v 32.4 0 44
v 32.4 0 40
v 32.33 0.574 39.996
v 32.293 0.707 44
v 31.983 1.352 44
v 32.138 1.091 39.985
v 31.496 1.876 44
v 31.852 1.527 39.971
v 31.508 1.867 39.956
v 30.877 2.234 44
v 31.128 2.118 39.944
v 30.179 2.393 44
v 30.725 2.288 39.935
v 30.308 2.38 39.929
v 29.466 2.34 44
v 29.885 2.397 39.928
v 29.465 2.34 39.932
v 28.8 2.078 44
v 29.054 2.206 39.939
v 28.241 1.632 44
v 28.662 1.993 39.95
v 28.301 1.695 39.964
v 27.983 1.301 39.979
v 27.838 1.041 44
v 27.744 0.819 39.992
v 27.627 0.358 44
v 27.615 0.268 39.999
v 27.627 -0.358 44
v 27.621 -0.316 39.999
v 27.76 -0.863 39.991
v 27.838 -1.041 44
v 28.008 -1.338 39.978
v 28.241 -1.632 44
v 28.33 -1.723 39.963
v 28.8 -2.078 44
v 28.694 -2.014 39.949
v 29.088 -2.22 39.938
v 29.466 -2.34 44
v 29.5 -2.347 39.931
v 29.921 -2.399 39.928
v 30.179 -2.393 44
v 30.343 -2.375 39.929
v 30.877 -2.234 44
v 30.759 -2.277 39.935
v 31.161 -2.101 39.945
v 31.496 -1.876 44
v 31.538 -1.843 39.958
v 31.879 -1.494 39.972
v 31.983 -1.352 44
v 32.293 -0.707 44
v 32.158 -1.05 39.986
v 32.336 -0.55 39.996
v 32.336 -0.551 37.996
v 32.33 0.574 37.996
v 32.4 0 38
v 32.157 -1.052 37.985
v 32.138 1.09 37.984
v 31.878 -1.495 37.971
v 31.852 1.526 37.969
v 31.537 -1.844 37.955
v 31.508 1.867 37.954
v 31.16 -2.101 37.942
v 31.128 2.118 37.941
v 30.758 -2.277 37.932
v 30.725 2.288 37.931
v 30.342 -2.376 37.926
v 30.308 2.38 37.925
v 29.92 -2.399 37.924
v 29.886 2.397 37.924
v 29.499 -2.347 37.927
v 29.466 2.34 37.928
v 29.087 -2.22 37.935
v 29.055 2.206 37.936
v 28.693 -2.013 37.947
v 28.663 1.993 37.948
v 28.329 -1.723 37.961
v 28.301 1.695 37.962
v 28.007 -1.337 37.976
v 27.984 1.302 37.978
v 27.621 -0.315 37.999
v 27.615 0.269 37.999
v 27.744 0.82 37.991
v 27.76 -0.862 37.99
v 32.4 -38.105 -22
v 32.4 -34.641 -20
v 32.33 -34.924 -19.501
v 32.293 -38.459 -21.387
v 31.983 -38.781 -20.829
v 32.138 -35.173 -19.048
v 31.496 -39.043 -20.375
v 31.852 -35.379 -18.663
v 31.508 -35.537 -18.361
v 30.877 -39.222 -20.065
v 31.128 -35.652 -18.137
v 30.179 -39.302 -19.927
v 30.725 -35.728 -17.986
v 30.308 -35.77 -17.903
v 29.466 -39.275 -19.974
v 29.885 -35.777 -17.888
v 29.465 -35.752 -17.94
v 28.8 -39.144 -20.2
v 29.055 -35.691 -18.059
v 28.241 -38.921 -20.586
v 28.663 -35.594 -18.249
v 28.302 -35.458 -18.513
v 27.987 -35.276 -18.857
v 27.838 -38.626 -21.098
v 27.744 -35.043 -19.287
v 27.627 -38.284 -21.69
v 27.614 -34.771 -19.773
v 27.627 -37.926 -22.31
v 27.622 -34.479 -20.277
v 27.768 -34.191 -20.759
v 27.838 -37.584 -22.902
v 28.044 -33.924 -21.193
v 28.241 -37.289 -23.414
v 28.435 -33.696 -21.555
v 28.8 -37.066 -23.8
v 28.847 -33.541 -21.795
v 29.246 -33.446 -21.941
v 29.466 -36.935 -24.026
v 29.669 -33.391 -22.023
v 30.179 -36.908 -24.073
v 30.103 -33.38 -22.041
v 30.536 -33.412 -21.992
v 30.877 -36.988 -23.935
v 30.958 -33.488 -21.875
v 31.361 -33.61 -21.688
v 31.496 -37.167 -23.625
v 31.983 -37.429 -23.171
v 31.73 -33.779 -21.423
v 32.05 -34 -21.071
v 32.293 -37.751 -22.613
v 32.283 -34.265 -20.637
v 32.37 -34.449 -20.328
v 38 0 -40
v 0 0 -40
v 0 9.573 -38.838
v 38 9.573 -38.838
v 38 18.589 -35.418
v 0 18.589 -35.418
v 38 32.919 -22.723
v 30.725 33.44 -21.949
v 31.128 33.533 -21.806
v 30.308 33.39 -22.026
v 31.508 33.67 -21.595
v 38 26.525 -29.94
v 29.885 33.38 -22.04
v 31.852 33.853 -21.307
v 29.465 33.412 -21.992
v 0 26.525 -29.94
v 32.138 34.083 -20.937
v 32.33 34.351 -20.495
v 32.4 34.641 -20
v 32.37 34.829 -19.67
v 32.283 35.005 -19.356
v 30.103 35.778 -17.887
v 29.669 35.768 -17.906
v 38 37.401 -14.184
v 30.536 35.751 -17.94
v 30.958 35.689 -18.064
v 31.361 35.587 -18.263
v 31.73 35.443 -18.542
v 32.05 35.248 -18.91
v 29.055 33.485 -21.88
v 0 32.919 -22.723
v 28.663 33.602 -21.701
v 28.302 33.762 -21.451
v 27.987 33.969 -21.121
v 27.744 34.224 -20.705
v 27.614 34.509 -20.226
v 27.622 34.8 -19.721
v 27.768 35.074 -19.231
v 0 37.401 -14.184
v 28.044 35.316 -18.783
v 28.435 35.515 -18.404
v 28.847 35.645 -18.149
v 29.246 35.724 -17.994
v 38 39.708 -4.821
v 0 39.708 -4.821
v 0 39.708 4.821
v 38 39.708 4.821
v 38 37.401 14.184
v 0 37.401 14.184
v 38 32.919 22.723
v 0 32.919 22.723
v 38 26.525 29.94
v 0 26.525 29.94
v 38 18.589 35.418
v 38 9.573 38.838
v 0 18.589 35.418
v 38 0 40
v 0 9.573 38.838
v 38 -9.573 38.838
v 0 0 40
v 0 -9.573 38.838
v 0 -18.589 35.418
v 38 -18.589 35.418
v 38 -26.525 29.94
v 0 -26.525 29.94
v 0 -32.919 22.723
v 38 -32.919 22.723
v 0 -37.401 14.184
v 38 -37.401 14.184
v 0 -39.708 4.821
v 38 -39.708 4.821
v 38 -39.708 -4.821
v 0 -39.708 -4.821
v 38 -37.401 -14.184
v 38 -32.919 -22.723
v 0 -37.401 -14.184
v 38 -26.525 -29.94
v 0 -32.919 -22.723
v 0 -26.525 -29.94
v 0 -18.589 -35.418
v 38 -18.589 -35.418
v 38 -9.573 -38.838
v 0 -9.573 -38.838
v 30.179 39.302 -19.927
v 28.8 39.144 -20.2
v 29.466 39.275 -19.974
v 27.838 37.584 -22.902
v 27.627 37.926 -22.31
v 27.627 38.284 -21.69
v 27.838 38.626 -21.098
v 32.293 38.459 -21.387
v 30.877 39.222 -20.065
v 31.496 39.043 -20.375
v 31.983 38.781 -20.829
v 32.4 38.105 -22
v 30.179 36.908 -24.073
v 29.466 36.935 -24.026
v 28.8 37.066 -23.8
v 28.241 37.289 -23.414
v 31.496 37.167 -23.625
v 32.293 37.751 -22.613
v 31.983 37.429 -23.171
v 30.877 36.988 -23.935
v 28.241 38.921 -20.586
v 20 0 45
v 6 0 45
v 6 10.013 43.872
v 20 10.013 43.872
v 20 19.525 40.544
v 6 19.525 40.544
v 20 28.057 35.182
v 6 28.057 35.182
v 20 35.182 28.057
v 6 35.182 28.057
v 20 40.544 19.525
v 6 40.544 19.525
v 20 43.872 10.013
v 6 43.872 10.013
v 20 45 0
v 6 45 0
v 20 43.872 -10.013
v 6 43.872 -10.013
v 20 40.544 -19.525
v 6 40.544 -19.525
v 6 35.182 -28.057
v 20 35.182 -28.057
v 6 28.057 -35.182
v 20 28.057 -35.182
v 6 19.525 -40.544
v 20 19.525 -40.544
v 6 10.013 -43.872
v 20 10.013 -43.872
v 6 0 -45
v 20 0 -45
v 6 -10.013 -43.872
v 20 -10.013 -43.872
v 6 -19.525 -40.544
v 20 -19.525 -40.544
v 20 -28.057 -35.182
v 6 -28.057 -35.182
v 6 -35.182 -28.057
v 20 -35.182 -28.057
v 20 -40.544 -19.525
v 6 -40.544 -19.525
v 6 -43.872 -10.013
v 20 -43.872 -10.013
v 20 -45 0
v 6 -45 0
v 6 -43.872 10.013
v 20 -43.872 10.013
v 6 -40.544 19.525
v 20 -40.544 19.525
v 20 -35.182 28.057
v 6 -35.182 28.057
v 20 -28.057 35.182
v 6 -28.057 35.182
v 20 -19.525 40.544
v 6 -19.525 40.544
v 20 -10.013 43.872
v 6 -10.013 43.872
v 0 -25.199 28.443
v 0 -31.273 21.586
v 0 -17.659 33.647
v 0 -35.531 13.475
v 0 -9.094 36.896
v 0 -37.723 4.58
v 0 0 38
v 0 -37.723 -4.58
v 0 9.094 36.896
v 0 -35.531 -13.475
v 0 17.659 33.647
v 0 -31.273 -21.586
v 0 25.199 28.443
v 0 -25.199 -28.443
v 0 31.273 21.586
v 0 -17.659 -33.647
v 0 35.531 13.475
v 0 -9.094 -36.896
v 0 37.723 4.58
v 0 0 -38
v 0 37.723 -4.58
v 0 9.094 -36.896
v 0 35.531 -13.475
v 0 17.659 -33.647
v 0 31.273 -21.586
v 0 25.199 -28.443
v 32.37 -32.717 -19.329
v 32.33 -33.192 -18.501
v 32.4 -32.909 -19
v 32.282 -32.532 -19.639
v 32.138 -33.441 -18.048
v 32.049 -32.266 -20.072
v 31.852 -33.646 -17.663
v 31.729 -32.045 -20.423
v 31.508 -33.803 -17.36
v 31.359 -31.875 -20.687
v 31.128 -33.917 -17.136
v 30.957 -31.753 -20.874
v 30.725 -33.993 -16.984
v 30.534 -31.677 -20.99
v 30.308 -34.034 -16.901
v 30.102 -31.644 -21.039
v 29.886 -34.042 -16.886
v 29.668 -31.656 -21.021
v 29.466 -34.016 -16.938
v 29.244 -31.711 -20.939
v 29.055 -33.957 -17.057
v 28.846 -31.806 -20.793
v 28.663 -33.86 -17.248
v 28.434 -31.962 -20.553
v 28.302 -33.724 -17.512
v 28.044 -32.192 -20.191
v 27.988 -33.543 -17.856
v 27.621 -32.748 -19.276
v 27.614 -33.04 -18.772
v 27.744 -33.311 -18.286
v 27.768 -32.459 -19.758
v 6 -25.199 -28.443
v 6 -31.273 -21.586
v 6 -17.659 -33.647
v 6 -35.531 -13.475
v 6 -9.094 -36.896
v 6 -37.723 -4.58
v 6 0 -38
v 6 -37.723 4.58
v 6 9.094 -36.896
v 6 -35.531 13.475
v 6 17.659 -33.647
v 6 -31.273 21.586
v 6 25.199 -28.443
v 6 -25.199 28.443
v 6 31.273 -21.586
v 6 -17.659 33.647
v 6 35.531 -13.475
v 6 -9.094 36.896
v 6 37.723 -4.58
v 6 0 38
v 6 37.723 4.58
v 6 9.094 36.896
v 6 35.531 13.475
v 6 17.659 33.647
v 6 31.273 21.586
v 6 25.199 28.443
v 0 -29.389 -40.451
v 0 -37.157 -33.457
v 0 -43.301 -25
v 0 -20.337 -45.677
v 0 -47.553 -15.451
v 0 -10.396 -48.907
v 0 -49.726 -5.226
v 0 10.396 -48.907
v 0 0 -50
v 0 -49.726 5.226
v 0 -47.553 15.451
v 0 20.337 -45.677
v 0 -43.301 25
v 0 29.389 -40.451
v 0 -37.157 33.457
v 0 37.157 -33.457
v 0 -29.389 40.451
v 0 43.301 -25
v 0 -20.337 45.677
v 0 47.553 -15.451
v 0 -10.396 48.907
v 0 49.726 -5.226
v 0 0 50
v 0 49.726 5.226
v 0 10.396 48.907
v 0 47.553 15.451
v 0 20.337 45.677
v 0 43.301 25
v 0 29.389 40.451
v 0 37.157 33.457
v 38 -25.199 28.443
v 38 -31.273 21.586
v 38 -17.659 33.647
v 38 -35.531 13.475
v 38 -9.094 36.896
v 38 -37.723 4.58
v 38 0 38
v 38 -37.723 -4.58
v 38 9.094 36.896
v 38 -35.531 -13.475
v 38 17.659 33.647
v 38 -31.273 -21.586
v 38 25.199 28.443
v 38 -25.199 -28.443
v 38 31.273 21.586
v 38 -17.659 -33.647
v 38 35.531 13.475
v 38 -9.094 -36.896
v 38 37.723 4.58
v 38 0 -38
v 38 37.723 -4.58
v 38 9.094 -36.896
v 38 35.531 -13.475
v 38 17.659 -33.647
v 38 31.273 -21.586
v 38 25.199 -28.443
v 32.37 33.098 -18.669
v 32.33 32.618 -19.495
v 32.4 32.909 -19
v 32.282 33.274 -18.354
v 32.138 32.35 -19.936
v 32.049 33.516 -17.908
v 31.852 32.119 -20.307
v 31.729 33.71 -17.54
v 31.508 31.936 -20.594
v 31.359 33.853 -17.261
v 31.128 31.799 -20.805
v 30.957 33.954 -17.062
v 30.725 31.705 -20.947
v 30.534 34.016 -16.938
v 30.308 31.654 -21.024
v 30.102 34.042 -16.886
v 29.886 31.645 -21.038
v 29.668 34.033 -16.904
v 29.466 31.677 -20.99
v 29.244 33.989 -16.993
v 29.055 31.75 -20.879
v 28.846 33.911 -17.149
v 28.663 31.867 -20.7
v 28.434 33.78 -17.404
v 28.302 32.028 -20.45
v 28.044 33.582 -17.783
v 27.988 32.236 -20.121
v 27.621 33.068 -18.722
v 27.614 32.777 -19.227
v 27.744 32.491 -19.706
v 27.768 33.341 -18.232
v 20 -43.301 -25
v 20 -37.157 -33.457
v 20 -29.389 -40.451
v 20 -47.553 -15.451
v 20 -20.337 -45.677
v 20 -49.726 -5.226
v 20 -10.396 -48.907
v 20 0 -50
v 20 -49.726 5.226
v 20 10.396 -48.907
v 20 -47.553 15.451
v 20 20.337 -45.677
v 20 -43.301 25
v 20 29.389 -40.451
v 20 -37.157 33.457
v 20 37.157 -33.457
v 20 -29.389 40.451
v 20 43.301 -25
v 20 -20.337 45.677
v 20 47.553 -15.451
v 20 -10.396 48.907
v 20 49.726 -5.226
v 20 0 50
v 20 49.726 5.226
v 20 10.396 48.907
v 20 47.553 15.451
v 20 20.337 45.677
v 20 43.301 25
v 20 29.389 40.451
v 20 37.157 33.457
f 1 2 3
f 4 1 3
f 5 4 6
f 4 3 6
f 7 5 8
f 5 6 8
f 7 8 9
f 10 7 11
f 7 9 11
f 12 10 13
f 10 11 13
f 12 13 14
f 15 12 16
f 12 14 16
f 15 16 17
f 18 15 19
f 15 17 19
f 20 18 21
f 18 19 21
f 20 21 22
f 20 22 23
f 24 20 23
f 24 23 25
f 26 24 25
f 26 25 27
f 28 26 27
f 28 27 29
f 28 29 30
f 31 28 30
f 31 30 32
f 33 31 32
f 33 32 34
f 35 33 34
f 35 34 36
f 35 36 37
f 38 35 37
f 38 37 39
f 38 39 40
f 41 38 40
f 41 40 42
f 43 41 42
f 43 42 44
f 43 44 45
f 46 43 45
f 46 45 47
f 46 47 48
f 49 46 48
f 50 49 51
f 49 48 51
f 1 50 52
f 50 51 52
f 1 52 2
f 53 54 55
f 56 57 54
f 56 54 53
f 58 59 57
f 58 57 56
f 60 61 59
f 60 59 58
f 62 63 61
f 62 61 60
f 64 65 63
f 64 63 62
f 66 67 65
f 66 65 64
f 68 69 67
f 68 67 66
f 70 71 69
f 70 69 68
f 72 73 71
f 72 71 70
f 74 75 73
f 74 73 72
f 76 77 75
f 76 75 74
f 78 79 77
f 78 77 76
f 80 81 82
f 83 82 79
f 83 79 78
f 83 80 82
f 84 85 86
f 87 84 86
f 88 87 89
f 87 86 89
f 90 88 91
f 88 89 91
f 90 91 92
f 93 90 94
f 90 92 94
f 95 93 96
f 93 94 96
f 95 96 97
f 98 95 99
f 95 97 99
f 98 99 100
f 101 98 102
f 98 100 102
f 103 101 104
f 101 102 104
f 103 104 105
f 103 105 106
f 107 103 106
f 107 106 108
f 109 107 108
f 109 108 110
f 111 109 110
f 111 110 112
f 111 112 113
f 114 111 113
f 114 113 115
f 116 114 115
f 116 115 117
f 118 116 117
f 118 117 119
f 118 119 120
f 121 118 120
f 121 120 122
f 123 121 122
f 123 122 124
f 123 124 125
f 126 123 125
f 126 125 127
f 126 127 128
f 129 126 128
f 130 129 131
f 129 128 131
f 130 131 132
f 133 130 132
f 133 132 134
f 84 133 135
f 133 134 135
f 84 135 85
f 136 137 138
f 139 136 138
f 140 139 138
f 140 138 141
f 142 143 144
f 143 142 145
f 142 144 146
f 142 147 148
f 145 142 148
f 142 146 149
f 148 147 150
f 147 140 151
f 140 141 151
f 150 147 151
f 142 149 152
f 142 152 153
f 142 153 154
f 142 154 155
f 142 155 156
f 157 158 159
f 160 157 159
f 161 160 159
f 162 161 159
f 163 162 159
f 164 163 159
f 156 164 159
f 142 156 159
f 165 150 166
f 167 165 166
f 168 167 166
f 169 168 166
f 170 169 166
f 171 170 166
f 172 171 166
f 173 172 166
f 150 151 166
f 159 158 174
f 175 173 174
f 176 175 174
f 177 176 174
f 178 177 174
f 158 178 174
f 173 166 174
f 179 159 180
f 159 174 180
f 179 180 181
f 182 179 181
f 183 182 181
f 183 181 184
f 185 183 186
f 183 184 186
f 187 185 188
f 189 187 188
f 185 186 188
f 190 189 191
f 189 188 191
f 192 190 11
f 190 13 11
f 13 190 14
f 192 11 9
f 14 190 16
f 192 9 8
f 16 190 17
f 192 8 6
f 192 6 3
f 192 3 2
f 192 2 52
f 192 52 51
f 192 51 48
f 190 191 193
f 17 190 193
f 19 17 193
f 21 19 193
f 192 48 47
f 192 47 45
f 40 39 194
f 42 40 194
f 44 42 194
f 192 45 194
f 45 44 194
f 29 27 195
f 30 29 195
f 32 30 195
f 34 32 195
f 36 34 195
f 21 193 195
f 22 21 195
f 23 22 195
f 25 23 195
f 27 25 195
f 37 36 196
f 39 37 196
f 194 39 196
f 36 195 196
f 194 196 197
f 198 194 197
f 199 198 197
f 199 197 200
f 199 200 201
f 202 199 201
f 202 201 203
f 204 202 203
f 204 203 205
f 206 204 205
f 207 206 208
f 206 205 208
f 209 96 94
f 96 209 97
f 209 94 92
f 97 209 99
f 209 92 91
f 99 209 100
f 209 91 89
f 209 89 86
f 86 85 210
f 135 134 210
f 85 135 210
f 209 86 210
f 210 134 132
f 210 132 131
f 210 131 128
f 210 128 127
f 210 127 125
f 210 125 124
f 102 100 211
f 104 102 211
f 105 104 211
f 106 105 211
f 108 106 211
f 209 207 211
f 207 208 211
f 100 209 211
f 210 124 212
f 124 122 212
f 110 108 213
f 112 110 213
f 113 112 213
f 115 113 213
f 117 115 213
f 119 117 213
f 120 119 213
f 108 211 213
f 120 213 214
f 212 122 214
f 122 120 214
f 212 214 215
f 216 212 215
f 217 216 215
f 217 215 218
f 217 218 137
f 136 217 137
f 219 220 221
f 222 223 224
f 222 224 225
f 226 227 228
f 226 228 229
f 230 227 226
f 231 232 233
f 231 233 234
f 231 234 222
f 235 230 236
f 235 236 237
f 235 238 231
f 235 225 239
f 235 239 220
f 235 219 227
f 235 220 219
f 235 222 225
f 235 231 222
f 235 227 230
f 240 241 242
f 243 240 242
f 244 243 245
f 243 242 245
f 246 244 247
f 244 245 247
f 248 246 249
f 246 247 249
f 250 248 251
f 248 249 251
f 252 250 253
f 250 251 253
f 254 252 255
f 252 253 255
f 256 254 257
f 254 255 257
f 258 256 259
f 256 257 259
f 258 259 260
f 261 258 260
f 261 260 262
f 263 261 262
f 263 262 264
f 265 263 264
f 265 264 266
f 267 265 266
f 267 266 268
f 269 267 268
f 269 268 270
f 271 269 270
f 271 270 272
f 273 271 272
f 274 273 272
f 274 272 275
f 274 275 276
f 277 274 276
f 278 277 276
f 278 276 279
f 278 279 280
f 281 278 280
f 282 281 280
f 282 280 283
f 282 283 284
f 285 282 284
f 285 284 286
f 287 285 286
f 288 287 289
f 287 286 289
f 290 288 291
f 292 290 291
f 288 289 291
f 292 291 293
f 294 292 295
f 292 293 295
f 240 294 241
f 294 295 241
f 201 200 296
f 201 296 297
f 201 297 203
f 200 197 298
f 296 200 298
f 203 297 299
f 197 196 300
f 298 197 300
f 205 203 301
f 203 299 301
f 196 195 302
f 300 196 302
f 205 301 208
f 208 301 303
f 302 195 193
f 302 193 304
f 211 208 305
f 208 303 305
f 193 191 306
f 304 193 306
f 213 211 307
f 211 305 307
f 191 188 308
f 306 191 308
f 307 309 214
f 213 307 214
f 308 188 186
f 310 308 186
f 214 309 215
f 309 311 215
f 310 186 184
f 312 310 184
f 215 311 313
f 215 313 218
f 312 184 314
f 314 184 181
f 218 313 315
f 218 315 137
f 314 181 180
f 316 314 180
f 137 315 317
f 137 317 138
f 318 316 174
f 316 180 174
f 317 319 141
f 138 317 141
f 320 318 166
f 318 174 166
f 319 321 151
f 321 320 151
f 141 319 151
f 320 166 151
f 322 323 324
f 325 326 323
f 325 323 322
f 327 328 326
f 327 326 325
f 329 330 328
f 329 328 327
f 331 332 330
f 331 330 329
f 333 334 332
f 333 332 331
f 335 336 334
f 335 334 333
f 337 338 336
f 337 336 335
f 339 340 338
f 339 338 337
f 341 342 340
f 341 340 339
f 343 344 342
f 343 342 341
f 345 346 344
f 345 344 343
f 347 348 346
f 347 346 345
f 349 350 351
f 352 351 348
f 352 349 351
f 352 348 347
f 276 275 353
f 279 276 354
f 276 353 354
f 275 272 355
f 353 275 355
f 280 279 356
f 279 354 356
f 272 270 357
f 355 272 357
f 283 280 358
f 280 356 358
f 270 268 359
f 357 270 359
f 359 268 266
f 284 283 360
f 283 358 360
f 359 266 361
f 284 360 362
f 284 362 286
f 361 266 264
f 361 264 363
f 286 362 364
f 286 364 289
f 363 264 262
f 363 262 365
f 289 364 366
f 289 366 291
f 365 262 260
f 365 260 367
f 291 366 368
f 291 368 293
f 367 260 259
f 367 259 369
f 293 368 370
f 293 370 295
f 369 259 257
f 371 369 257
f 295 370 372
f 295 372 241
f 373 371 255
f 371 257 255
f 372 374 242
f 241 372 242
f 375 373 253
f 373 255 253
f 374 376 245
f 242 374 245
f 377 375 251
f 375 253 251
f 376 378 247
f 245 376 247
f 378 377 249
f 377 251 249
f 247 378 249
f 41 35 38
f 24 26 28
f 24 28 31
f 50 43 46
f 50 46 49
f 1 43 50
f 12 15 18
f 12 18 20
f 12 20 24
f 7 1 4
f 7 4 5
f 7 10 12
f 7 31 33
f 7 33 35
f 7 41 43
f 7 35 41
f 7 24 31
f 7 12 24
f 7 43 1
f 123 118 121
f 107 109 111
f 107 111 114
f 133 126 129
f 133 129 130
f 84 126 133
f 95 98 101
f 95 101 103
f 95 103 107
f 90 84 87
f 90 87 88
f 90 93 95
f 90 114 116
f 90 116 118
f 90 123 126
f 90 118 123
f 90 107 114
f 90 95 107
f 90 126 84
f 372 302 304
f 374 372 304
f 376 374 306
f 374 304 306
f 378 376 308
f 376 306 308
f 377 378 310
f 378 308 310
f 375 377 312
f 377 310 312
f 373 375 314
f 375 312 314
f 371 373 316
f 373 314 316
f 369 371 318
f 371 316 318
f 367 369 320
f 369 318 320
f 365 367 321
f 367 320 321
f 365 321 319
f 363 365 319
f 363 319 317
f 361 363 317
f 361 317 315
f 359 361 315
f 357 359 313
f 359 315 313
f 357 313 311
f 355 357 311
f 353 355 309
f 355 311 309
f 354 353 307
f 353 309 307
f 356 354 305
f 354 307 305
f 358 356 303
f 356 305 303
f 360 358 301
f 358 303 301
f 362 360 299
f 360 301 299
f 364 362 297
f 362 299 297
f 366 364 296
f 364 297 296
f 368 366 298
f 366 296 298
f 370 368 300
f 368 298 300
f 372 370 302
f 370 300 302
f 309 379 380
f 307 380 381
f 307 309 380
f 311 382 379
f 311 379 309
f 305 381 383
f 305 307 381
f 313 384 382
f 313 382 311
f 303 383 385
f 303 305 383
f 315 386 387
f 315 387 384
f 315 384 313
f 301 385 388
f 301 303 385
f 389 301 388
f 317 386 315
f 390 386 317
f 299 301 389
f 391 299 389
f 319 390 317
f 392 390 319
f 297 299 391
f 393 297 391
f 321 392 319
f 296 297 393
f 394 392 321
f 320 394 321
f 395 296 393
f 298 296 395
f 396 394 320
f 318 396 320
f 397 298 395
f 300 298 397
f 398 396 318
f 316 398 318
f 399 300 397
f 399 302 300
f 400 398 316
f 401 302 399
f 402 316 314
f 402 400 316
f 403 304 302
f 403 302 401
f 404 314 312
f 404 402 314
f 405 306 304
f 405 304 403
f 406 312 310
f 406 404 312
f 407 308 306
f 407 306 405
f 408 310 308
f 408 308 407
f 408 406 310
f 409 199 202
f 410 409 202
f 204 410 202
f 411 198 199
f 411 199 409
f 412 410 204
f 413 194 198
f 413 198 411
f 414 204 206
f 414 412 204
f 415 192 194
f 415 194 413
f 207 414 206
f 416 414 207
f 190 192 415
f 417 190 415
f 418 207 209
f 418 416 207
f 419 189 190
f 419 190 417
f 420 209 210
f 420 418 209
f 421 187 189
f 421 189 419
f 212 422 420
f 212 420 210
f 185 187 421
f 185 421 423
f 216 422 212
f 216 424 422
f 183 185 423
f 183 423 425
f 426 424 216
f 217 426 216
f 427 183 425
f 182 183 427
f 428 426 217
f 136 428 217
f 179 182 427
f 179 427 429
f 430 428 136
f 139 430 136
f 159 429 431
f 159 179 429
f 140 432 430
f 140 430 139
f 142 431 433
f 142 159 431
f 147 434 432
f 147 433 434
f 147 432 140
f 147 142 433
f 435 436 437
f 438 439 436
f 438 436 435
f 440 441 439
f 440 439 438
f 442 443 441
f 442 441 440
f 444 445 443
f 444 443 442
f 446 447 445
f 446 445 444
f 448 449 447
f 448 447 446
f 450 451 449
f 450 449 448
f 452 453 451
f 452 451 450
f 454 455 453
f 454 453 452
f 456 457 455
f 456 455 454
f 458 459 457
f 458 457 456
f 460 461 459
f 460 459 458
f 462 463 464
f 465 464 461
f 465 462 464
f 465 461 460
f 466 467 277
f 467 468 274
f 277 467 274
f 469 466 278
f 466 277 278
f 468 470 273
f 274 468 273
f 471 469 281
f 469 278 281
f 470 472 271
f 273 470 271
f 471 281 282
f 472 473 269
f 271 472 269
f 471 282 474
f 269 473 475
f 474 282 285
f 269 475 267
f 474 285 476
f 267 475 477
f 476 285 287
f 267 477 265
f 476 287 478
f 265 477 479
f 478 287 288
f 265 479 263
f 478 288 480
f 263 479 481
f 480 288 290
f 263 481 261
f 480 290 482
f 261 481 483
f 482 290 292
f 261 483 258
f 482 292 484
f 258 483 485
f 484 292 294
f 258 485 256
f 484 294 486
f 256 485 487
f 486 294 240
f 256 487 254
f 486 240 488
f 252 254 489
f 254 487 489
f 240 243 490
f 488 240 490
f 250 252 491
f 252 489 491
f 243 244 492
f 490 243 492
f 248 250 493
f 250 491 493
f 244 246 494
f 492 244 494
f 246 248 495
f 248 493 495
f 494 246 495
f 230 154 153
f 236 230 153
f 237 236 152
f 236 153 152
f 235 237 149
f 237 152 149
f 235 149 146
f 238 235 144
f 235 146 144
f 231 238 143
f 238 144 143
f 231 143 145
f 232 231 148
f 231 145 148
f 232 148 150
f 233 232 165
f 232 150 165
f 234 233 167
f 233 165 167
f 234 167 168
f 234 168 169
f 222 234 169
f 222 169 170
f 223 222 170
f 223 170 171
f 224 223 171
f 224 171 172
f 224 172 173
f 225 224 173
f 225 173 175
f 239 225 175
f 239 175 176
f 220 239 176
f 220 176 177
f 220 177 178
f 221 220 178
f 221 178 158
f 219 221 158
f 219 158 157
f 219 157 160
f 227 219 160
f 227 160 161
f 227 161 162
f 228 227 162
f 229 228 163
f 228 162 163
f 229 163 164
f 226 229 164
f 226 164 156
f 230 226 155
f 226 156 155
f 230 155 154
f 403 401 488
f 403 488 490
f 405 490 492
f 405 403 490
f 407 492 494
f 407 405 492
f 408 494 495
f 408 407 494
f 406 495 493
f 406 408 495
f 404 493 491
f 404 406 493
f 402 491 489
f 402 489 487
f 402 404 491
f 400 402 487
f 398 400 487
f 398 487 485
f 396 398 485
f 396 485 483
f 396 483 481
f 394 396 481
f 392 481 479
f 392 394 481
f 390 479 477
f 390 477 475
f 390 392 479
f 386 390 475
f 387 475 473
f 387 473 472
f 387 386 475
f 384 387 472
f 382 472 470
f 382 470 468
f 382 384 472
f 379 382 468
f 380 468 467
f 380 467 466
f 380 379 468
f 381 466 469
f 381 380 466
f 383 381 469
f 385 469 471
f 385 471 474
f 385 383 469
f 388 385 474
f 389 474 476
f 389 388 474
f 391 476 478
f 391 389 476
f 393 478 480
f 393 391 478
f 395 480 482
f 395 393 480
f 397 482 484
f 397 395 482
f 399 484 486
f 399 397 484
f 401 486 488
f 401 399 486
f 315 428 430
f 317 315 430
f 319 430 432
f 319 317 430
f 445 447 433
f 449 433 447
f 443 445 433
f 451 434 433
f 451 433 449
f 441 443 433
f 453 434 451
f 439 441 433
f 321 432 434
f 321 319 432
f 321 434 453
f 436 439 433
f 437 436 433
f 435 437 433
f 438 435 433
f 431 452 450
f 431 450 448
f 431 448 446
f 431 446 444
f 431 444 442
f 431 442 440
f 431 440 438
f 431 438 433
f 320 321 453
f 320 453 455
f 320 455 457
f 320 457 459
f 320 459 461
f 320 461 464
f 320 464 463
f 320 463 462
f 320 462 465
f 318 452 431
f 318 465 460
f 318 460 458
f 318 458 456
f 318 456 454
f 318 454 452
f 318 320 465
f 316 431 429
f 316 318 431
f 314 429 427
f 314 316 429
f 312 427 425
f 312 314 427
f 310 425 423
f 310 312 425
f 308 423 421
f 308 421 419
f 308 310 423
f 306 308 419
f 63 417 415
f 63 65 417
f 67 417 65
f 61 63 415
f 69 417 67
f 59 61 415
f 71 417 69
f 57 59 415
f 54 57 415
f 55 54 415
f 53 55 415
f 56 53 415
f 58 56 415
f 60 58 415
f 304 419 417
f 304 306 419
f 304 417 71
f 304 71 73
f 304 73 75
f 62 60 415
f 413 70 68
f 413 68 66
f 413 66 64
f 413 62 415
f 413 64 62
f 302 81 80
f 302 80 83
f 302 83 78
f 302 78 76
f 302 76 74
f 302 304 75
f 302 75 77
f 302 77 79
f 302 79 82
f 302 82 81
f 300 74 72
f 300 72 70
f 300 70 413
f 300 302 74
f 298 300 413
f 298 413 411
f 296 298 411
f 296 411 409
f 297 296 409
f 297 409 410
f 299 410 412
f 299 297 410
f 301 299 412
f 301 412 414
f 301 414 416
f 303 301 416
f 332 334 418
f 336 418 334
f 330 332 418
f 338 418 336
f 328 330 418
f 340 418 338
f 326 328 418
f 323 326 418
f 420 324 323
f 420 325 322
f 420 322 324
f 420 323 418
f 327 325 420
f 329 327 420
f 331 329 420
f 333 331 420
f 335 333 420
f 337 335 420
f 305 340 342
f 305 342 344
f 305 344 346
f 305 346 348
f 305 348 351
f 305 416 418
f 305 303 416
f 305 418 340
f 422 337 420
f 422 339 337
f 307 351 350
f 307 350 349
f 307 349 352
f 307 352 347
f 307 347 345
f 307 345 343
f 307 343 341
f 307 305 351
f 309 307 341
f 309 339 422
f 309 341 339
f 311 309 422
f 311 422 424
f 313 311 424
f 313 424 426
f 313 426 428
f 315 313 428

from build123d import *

# Parameters (mm, degrees)
SKETCH1_R           = 40
SKETCH1_R_2         = 38
BOSS_EXTRUDE1_DEPTH = 38
SKETCH2_R           = 2.4
BOSS_EXTRUDE3_DEPTH = 44
CIRPATTERN1_COUNT   = 3
SKETCH1_3_R         = 38
CUT_EXTRUDE2_DEPTH  = 71.56911523
SKETCH3_R           = 50
SKETCH3_R_2         = 45
BOSS_EXTRUDE4_DEPTH = 20
SKETCH3_4_R         = 45
SKETCH3_4_R_2       = 38
BOSS_EXTRUDE5_DEPTH = 6


with BuildPart() as part:
    # Sketch1 → Boss-Extrude1 (new body)
    with BuildSketch(Plane(origin=(0, 0, 0), x_dir=(0, 0, -1), z_dir=(1, 0, 0))):
        Circle(SKETCH1_R)
        Circle(SKETCH1_R_2, mode=Mode.SUBTRACT)
    extrude(amount=BOSS_EXTRUDE1_DEPTH)

    # Sketch2 → Boss-Extrude3 (add)
    with BuildSketch(Plane.XY):
        with Locations((30, 0)):
            Circle(SKETCH2_R)
    boss_extrude3 = extrude(amount=BOSS_EXTRUDE3_DEPTH)

    # CirPattern1: Boss-Extrude3 ×3 about axis
    cirpattern1_axis = Axis((38, 0, 0), (1, 0, 0))
    for i in range(1, CIRPATTERN1_COUNT):
        add(boss_extrude3.rotate(cirpattern1_axis, i * 360 / CIRPATTERN1_COUNT))

    # Sketch1<3> → Cut-Extrude2 (cut, through all)
    with BuildSketch(Plane(origin=(0, 0, 0), x_dir=(0, 0, -1), z_dir=(1, 0, 0))):
        Circle(SKETCH1_3_R)
    extrude(amount=CUT_EXTRUDE2_DEPTH, mode=Mode.SUBTRACT)


with BuildPart() as body_2:
    # Sketch3 → Boss-Extrude4 (new body)
    with BuildSketch(Plane.ZY):
        Circle(SKETCH3_R)
        Circle(SKETCH3_R_2, mode=Mode.SUBTRACT)
    extrude(amount=-BOSS_EXTRUDE4_DEPTH)

    # Sketch3<4> → Boss-Extrude5 (add)
    with BuildSketch(Plane.ZY):
        Circle(SKETCH3_4_R)
        Circle(SKETCH3_4_R_2, mode=Mode.SUBTRACT)
    extrude(amount=-BOSS_EXTRUDE5_DEPTH)


solid = Compound([part.part, body_2.part])
